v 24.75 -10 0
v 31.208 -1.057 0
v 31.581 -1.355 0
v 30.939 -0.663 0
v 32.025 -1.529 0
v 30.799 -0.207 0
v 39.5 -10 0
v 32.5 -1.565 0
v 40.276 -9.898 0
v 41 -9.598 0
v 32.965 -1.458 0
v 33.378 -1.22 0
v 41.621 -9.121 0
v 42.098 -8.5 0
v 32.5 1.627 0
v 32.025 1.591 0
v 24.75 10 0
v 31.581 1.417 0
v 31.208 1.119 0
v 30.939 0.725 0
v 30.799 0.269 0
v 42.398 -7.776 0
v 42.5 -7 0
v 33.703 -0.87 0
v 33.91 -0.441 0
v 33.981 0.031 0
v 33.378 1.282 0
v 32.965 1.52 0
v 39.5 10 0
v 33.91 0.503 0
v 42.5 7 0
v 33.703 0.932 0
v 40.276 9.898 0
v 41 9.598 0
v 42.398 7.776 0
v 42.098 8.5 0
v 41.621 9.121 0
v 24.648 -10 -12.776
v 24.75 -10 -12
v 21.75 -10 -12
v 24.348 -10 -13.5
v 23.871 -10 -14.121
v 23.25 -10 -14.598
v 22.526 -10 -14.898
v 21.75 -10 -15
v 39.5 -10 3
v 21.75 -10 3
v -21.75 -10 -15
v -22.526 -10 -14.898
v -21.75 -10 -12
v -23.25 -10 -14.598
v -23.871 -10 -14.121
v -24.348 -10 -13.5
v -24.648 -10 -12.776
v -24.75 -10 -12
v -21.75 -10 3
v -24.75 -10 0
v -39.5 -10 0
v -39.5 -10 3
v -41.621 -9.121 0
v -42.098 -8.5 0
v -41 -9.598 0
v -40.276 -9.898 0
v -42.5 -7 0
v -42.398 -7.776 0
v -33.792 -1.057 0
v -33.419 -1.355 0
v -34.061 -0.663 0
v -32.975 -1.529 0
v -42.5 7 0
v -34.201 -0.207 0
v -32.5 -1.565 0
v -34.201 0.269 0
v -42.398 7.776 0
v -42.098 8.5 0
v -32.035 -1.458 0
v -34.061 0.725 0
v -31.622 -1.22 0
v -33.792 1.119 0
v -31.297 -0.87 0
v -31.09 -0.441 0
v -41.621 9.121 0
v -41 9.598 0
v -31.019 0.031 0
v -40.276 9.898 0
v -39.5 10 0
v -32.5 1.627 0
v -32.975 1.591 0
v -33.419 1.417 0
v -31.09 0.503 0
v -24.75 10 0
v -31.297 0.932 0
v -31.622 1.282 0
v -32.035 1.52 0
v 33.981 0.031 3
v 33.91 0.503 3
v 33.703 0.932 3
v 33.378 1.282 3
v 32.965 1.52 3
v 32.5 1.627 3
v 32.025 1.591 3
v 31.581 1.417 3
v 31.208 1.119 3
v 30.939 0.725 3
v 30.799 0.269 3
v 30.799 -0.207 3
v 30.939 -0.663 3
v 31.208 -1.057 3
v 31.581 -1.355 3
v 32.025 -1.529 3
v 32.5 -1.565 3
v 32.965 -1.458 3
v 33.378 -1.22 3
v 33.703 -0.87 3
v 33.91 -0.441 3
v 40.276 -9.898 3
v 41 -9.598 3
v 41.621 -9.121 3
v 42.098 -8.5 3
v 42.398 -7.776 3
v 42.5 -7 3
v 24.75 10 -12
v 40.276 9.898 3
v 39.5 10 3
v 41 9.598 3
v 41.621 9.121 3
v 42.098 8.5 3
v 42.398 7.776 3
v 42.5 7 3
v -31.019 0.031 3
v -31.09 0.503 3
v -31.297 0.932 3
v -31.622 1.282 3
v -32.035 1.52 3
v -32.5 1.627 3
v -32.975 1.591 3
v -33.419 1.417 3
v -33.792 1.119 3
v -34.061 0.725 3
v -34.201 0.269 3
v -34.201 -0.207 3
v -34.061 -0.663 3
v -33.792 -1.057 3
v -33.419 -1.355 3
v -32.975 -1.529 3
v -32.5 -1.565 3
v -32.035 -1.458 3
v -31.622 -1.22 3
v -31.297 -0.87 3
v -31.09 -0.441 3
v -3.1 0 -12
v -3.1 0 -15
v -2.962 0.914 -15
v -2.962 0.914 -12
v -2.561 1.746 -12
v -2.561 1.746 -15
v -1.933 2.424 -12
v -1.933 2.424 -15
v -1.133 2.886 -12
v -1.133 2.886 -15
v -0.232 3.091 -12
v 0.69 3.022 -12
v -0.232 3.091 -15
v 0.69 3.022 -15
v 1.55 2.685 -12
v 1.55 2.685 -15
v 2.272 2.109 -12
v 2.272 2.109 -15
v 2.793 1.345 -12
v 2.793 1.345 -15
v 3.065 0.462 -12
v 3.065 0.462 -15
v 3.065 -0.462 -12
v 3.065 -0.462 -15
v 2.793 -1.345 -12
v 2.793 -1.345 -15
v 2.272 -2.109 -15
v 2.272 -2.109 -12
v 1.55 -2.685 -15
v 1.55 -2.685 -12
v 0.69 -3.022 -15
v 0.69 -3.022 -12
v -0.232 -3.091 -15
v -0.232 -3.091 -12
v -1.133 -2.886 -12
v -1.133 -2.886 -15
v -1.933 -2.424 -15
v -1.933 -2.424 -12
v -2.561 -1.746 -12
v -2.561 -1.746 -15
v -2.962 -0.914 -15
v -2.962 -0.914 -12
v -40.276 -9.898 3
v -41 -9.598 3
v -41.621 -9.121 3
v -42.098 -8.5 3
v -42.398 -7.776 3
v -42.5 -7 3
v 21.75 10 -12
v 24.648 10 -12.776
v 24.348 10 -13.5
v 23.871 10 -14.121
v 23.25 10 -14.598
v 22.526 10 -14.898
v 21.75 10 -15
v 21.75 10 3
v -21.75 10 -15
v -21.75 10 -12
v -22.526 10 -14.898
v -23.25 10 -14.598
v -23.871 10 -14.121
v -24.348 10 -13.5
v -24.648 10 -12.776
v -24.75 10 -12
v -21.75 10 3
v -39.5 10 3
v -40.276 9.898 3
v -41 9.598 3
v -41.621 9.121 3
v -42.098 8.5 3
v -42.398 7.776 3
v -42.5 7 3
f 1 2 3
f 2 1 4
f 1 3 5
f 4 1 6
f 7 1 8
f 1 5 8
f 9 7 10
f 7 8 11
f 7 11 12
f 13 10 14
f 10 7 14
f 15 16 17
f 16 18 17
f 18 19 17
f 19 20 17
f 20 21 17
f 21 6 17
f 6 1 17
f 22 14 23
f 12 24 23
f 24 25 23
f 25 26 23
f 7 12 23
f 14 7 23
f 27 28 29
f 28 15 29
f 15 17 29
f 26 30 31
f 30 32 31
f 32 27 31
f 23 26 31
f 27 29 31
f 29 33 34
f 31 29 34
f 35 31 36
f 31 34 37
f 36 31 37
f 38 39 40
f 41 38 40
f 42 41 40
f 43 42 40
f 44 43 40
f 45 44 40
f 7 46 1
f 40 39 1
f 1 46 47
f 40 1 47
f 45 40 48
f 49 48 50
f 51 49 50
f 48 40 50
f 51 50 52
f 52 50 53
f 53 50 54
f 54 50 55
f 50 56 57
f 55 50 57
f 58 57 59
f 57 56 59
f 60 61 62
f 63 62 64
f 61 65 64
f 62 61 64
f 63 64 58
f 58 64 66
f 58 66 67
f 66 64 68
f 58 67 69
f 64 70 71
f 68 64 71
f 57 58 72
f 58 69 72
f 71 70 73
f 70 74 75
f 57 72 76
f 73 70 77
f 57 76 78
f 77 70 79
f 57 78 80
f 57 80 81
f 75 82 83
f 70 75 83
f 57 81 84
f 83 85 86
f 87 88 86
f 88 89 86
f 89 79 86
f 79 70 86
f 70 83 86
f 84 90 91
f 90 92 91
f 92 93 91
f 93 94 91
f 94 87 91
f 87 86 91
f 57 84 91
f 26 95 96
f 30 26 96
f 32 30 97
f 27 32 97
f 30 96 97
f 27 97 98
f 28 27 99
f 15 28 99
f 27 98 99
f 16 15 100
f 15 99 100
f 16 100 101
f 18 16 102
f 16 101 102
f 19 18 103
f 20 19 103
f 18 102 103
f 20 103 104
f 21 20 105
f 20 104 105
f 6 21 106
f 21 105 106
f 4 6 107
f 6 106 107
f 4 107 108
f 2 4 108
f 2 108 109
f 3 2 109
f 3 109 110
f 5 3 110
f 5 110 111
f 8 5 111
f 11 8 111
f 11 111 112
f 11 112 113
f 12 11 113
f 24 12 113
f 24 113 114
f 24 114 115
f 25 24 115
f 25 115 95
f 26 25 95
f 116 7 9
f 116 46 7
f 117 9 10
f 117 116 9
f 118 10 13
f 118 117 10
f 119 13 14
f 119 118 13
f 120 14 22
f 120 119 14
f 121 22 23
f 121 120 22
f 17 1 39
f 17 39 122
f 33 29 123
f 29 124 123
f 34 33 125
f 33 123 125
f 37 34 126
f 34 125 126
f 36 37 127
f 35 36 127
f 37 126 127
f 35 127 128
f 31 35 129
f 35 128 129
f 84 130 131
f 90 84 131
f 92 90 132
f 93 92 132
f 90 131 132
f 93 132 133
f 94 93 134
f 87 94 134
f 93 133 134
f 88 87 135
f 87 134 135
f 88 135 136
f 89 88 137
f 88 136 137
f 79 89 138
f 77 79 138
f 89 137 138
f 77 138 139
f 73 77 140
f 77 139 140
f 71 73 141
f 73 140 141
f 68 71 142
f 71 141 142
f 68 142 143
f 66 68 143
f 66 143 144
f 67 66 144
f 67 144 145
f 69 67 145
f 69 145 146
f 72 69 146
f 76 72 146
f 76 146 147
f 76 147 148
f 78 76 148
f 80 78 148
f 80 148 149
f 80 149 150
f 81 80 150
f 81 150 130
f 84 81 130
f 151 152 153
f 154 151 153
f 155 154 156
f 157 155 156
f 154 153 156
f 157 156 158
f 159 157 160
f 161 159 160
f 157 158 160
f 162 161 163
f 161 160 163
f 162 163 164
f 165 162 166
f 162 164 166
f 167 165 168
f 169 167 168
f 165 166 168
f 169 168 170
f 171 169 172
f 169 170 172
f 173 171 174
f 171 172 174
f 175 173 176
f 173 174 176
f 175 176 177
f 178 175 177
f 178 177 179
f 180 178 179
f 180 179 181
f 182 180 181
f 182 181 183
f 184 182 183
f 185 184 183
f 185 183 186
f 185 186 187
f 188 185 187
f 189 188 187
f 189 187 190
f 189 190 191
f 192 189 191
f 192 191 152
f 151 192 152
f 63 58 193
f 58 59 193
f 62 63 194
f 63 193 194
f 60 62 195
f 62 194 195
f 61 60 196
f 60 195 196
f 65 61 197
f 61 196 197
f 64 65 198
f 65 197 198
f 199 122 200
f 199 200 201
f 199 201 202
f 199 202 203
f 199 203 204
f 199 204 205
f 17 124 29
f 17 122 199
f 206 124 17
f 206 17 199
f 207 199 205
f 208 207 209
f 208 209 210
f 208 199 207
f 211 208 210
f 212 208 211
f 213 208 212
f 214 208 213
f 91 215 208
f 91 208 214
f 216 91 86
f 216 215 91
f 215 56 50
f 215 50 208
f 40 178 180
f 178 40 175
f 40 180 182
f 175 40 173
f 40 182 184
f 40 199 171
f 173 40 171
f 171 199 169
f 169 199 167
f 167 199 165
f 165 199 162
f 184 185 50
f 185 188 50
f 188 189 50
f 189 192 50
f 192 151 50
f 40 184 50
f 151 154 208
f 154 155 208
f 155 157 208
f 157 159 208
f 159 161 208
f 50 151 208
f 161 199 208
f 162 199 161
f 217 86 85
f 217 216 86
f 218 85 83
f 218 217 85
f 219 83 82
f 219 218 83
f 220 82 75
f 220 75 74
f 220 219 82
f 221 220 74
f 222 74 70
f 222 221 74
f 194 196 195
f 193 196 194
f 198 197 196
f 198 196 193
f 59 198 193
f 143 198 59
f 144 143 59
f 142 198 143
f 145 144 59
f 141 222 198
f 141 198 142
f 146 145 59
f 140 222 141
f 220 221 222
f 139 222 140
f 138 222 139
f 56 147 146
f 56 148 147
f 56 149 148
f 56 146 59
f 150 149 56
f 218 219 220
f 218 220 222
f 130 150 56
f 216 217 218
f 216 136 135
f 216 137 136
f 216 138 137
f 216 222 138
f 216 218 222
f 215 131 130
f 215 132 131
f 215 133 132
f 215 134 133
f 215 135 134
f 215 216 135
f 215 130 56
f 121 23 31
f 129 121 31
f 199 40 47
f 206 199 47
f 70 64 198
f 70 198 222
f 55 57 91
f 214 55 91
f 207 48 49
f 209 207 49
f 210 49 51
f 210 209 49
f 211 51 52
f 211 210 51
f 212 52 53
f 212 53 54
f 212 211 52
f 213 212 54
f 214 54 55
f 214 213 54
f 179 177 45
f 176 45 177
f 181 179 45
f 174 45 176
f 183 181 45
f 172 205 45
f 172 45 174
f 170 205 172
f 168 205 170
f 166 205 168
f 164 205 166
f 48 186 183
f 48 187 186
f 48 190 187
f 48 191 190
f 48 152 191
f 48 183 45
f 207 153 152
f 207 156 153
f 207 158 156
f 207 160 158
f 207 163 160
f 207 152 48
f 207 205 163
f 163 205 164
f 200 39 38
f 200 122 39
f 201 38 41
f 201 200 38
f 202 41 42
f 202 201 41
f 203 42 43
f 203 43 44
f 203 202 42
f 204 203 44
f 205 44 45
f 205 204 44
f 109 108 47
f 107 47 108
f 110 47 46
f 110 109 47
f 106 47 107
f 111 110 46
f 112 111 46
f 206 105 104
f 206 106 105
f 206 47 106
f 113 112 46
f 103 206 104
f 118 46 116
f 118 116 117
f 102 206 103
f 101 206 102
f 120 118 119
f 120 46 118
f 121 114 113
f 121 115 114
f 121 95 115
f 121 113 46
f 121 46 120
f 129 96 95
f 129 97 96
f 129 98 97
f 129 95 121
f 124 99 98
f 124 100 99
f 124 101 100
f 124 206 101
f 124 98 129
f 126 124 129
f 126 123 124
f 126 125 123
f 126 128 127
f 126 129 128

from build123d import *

# Parameters (mm, degrees)
SKETCH1_W           = 85
SKETCH1_H           = 20
BOSS_EXTRUDE1_DEPTH = 3
SKETCH2_W           = 3
SKETCH2_H           = 20
BOSS_EXTRUDE2_DEPTH = 12
SKETCH3_W           = 49.5
SKETCH3_H           = 20
BOSS_EXTRUDE3_DEPTH = 3
SKETCH4_W           = 43.5
SKETCH4_H           = 3
CUT_EXTRUDE1_DEPTH  = 50.307707308
SKETCH5_R           = 3.1
CUT_EXTRUDE2_DEPTH  = 48.22552276
SKETCH6_R           = 1.6
CUT_EXTRUDE3_DEPTH  = 48.22552276
FILLET1_R           = 3


with BuildPart() as part:
    # Sketch1 → Boss-Extrude1 (new body)
    with BuildSketch(Plane.XY):
        Rectangle(SKETCH1_W, SKETCH1_H)
    extrude(amount=BOSS_EXTRUDE1_DEPTH)

    # Sketch2 → Boss-Extrude2 (add)
    with BuildSketch(Plane(origin=(0, 0, 0), x_dir=(-1, 0, 0), z_dir=(0, 0, -1))):
        with Locations((-23.25, 0)):
            Rectangle(SKETCH2_W, SKETCH2_H)
        with Locations((23.25, 0)):
            Rectangle(SKETCH2_W, SKETCH2_H)
    extrude(amount=BOSS_EXTRUDE2_DEPTH)

    # Sketch3 → Boss-Extrude3 (add)
    with BuildSketch(Plane(origin=(0, 0, -12), x_dir=(-1, 0, 0), z_dir=(0, 0, -1))):
        Rectangle(SKETCH3_W, SKETCH3_H)
    extrude(amount=BOSS_EXTRUDE3_DEPTH)

    # Sketch4 → Cut-Extrude1 (cut, through all)
    with BuildSketch(Plane.XZ.offset(10)):
        with Locations((0, 1.5)):
            Rectangle(SKETCH4_W, SKETCH4_H)
    extrude(amount=-CUT_EXTRUDE1_DEPTH, mode=Mode.SUBTRACT)

    # Sketch5 → Cut-Extrude2 (cut, through all)
    with BuildSketch(Plane(origin=(0, 0, -15), x_dir=(-1, 0, 0), z_dir=(0, 0, -1))):
        Circle(SKETCH5_R)
    extrude(amount=-CUT_EXTRUDE2_DEPTH, mode=Mode.SUBTRACT)

    # Sketch6 → Cut-Extrude3 (cut, through all)
    with BuildSketch(Plane.XY.offset(3)):
        with Locations((32.380648159, 0.030992543)):
            Circle(SKETCH6_R)
        with Locations((-32.619351841, 0.030992543)):
            Circle(SKETCH6_R)
    extrude(amount=-CUT_EXTRUDE3_DEPTH, mode=Mode.SUBTRACT)

    # Fillet1
    fillet1_edges = [part.edges().sort_by_distance(p)[0] for p in [
        (24.75, 0, -15),
        (-24.75, 0, -15),
        (42.5, -10, 1.5),
        (-42.5, -10, 1.5),
        (-42.5, 10, 1.5),
        (42.5, 10, 1.5),
    ]]
    fillet(fillet1_edges, radius=FILLET1_R)


solid = part.part
